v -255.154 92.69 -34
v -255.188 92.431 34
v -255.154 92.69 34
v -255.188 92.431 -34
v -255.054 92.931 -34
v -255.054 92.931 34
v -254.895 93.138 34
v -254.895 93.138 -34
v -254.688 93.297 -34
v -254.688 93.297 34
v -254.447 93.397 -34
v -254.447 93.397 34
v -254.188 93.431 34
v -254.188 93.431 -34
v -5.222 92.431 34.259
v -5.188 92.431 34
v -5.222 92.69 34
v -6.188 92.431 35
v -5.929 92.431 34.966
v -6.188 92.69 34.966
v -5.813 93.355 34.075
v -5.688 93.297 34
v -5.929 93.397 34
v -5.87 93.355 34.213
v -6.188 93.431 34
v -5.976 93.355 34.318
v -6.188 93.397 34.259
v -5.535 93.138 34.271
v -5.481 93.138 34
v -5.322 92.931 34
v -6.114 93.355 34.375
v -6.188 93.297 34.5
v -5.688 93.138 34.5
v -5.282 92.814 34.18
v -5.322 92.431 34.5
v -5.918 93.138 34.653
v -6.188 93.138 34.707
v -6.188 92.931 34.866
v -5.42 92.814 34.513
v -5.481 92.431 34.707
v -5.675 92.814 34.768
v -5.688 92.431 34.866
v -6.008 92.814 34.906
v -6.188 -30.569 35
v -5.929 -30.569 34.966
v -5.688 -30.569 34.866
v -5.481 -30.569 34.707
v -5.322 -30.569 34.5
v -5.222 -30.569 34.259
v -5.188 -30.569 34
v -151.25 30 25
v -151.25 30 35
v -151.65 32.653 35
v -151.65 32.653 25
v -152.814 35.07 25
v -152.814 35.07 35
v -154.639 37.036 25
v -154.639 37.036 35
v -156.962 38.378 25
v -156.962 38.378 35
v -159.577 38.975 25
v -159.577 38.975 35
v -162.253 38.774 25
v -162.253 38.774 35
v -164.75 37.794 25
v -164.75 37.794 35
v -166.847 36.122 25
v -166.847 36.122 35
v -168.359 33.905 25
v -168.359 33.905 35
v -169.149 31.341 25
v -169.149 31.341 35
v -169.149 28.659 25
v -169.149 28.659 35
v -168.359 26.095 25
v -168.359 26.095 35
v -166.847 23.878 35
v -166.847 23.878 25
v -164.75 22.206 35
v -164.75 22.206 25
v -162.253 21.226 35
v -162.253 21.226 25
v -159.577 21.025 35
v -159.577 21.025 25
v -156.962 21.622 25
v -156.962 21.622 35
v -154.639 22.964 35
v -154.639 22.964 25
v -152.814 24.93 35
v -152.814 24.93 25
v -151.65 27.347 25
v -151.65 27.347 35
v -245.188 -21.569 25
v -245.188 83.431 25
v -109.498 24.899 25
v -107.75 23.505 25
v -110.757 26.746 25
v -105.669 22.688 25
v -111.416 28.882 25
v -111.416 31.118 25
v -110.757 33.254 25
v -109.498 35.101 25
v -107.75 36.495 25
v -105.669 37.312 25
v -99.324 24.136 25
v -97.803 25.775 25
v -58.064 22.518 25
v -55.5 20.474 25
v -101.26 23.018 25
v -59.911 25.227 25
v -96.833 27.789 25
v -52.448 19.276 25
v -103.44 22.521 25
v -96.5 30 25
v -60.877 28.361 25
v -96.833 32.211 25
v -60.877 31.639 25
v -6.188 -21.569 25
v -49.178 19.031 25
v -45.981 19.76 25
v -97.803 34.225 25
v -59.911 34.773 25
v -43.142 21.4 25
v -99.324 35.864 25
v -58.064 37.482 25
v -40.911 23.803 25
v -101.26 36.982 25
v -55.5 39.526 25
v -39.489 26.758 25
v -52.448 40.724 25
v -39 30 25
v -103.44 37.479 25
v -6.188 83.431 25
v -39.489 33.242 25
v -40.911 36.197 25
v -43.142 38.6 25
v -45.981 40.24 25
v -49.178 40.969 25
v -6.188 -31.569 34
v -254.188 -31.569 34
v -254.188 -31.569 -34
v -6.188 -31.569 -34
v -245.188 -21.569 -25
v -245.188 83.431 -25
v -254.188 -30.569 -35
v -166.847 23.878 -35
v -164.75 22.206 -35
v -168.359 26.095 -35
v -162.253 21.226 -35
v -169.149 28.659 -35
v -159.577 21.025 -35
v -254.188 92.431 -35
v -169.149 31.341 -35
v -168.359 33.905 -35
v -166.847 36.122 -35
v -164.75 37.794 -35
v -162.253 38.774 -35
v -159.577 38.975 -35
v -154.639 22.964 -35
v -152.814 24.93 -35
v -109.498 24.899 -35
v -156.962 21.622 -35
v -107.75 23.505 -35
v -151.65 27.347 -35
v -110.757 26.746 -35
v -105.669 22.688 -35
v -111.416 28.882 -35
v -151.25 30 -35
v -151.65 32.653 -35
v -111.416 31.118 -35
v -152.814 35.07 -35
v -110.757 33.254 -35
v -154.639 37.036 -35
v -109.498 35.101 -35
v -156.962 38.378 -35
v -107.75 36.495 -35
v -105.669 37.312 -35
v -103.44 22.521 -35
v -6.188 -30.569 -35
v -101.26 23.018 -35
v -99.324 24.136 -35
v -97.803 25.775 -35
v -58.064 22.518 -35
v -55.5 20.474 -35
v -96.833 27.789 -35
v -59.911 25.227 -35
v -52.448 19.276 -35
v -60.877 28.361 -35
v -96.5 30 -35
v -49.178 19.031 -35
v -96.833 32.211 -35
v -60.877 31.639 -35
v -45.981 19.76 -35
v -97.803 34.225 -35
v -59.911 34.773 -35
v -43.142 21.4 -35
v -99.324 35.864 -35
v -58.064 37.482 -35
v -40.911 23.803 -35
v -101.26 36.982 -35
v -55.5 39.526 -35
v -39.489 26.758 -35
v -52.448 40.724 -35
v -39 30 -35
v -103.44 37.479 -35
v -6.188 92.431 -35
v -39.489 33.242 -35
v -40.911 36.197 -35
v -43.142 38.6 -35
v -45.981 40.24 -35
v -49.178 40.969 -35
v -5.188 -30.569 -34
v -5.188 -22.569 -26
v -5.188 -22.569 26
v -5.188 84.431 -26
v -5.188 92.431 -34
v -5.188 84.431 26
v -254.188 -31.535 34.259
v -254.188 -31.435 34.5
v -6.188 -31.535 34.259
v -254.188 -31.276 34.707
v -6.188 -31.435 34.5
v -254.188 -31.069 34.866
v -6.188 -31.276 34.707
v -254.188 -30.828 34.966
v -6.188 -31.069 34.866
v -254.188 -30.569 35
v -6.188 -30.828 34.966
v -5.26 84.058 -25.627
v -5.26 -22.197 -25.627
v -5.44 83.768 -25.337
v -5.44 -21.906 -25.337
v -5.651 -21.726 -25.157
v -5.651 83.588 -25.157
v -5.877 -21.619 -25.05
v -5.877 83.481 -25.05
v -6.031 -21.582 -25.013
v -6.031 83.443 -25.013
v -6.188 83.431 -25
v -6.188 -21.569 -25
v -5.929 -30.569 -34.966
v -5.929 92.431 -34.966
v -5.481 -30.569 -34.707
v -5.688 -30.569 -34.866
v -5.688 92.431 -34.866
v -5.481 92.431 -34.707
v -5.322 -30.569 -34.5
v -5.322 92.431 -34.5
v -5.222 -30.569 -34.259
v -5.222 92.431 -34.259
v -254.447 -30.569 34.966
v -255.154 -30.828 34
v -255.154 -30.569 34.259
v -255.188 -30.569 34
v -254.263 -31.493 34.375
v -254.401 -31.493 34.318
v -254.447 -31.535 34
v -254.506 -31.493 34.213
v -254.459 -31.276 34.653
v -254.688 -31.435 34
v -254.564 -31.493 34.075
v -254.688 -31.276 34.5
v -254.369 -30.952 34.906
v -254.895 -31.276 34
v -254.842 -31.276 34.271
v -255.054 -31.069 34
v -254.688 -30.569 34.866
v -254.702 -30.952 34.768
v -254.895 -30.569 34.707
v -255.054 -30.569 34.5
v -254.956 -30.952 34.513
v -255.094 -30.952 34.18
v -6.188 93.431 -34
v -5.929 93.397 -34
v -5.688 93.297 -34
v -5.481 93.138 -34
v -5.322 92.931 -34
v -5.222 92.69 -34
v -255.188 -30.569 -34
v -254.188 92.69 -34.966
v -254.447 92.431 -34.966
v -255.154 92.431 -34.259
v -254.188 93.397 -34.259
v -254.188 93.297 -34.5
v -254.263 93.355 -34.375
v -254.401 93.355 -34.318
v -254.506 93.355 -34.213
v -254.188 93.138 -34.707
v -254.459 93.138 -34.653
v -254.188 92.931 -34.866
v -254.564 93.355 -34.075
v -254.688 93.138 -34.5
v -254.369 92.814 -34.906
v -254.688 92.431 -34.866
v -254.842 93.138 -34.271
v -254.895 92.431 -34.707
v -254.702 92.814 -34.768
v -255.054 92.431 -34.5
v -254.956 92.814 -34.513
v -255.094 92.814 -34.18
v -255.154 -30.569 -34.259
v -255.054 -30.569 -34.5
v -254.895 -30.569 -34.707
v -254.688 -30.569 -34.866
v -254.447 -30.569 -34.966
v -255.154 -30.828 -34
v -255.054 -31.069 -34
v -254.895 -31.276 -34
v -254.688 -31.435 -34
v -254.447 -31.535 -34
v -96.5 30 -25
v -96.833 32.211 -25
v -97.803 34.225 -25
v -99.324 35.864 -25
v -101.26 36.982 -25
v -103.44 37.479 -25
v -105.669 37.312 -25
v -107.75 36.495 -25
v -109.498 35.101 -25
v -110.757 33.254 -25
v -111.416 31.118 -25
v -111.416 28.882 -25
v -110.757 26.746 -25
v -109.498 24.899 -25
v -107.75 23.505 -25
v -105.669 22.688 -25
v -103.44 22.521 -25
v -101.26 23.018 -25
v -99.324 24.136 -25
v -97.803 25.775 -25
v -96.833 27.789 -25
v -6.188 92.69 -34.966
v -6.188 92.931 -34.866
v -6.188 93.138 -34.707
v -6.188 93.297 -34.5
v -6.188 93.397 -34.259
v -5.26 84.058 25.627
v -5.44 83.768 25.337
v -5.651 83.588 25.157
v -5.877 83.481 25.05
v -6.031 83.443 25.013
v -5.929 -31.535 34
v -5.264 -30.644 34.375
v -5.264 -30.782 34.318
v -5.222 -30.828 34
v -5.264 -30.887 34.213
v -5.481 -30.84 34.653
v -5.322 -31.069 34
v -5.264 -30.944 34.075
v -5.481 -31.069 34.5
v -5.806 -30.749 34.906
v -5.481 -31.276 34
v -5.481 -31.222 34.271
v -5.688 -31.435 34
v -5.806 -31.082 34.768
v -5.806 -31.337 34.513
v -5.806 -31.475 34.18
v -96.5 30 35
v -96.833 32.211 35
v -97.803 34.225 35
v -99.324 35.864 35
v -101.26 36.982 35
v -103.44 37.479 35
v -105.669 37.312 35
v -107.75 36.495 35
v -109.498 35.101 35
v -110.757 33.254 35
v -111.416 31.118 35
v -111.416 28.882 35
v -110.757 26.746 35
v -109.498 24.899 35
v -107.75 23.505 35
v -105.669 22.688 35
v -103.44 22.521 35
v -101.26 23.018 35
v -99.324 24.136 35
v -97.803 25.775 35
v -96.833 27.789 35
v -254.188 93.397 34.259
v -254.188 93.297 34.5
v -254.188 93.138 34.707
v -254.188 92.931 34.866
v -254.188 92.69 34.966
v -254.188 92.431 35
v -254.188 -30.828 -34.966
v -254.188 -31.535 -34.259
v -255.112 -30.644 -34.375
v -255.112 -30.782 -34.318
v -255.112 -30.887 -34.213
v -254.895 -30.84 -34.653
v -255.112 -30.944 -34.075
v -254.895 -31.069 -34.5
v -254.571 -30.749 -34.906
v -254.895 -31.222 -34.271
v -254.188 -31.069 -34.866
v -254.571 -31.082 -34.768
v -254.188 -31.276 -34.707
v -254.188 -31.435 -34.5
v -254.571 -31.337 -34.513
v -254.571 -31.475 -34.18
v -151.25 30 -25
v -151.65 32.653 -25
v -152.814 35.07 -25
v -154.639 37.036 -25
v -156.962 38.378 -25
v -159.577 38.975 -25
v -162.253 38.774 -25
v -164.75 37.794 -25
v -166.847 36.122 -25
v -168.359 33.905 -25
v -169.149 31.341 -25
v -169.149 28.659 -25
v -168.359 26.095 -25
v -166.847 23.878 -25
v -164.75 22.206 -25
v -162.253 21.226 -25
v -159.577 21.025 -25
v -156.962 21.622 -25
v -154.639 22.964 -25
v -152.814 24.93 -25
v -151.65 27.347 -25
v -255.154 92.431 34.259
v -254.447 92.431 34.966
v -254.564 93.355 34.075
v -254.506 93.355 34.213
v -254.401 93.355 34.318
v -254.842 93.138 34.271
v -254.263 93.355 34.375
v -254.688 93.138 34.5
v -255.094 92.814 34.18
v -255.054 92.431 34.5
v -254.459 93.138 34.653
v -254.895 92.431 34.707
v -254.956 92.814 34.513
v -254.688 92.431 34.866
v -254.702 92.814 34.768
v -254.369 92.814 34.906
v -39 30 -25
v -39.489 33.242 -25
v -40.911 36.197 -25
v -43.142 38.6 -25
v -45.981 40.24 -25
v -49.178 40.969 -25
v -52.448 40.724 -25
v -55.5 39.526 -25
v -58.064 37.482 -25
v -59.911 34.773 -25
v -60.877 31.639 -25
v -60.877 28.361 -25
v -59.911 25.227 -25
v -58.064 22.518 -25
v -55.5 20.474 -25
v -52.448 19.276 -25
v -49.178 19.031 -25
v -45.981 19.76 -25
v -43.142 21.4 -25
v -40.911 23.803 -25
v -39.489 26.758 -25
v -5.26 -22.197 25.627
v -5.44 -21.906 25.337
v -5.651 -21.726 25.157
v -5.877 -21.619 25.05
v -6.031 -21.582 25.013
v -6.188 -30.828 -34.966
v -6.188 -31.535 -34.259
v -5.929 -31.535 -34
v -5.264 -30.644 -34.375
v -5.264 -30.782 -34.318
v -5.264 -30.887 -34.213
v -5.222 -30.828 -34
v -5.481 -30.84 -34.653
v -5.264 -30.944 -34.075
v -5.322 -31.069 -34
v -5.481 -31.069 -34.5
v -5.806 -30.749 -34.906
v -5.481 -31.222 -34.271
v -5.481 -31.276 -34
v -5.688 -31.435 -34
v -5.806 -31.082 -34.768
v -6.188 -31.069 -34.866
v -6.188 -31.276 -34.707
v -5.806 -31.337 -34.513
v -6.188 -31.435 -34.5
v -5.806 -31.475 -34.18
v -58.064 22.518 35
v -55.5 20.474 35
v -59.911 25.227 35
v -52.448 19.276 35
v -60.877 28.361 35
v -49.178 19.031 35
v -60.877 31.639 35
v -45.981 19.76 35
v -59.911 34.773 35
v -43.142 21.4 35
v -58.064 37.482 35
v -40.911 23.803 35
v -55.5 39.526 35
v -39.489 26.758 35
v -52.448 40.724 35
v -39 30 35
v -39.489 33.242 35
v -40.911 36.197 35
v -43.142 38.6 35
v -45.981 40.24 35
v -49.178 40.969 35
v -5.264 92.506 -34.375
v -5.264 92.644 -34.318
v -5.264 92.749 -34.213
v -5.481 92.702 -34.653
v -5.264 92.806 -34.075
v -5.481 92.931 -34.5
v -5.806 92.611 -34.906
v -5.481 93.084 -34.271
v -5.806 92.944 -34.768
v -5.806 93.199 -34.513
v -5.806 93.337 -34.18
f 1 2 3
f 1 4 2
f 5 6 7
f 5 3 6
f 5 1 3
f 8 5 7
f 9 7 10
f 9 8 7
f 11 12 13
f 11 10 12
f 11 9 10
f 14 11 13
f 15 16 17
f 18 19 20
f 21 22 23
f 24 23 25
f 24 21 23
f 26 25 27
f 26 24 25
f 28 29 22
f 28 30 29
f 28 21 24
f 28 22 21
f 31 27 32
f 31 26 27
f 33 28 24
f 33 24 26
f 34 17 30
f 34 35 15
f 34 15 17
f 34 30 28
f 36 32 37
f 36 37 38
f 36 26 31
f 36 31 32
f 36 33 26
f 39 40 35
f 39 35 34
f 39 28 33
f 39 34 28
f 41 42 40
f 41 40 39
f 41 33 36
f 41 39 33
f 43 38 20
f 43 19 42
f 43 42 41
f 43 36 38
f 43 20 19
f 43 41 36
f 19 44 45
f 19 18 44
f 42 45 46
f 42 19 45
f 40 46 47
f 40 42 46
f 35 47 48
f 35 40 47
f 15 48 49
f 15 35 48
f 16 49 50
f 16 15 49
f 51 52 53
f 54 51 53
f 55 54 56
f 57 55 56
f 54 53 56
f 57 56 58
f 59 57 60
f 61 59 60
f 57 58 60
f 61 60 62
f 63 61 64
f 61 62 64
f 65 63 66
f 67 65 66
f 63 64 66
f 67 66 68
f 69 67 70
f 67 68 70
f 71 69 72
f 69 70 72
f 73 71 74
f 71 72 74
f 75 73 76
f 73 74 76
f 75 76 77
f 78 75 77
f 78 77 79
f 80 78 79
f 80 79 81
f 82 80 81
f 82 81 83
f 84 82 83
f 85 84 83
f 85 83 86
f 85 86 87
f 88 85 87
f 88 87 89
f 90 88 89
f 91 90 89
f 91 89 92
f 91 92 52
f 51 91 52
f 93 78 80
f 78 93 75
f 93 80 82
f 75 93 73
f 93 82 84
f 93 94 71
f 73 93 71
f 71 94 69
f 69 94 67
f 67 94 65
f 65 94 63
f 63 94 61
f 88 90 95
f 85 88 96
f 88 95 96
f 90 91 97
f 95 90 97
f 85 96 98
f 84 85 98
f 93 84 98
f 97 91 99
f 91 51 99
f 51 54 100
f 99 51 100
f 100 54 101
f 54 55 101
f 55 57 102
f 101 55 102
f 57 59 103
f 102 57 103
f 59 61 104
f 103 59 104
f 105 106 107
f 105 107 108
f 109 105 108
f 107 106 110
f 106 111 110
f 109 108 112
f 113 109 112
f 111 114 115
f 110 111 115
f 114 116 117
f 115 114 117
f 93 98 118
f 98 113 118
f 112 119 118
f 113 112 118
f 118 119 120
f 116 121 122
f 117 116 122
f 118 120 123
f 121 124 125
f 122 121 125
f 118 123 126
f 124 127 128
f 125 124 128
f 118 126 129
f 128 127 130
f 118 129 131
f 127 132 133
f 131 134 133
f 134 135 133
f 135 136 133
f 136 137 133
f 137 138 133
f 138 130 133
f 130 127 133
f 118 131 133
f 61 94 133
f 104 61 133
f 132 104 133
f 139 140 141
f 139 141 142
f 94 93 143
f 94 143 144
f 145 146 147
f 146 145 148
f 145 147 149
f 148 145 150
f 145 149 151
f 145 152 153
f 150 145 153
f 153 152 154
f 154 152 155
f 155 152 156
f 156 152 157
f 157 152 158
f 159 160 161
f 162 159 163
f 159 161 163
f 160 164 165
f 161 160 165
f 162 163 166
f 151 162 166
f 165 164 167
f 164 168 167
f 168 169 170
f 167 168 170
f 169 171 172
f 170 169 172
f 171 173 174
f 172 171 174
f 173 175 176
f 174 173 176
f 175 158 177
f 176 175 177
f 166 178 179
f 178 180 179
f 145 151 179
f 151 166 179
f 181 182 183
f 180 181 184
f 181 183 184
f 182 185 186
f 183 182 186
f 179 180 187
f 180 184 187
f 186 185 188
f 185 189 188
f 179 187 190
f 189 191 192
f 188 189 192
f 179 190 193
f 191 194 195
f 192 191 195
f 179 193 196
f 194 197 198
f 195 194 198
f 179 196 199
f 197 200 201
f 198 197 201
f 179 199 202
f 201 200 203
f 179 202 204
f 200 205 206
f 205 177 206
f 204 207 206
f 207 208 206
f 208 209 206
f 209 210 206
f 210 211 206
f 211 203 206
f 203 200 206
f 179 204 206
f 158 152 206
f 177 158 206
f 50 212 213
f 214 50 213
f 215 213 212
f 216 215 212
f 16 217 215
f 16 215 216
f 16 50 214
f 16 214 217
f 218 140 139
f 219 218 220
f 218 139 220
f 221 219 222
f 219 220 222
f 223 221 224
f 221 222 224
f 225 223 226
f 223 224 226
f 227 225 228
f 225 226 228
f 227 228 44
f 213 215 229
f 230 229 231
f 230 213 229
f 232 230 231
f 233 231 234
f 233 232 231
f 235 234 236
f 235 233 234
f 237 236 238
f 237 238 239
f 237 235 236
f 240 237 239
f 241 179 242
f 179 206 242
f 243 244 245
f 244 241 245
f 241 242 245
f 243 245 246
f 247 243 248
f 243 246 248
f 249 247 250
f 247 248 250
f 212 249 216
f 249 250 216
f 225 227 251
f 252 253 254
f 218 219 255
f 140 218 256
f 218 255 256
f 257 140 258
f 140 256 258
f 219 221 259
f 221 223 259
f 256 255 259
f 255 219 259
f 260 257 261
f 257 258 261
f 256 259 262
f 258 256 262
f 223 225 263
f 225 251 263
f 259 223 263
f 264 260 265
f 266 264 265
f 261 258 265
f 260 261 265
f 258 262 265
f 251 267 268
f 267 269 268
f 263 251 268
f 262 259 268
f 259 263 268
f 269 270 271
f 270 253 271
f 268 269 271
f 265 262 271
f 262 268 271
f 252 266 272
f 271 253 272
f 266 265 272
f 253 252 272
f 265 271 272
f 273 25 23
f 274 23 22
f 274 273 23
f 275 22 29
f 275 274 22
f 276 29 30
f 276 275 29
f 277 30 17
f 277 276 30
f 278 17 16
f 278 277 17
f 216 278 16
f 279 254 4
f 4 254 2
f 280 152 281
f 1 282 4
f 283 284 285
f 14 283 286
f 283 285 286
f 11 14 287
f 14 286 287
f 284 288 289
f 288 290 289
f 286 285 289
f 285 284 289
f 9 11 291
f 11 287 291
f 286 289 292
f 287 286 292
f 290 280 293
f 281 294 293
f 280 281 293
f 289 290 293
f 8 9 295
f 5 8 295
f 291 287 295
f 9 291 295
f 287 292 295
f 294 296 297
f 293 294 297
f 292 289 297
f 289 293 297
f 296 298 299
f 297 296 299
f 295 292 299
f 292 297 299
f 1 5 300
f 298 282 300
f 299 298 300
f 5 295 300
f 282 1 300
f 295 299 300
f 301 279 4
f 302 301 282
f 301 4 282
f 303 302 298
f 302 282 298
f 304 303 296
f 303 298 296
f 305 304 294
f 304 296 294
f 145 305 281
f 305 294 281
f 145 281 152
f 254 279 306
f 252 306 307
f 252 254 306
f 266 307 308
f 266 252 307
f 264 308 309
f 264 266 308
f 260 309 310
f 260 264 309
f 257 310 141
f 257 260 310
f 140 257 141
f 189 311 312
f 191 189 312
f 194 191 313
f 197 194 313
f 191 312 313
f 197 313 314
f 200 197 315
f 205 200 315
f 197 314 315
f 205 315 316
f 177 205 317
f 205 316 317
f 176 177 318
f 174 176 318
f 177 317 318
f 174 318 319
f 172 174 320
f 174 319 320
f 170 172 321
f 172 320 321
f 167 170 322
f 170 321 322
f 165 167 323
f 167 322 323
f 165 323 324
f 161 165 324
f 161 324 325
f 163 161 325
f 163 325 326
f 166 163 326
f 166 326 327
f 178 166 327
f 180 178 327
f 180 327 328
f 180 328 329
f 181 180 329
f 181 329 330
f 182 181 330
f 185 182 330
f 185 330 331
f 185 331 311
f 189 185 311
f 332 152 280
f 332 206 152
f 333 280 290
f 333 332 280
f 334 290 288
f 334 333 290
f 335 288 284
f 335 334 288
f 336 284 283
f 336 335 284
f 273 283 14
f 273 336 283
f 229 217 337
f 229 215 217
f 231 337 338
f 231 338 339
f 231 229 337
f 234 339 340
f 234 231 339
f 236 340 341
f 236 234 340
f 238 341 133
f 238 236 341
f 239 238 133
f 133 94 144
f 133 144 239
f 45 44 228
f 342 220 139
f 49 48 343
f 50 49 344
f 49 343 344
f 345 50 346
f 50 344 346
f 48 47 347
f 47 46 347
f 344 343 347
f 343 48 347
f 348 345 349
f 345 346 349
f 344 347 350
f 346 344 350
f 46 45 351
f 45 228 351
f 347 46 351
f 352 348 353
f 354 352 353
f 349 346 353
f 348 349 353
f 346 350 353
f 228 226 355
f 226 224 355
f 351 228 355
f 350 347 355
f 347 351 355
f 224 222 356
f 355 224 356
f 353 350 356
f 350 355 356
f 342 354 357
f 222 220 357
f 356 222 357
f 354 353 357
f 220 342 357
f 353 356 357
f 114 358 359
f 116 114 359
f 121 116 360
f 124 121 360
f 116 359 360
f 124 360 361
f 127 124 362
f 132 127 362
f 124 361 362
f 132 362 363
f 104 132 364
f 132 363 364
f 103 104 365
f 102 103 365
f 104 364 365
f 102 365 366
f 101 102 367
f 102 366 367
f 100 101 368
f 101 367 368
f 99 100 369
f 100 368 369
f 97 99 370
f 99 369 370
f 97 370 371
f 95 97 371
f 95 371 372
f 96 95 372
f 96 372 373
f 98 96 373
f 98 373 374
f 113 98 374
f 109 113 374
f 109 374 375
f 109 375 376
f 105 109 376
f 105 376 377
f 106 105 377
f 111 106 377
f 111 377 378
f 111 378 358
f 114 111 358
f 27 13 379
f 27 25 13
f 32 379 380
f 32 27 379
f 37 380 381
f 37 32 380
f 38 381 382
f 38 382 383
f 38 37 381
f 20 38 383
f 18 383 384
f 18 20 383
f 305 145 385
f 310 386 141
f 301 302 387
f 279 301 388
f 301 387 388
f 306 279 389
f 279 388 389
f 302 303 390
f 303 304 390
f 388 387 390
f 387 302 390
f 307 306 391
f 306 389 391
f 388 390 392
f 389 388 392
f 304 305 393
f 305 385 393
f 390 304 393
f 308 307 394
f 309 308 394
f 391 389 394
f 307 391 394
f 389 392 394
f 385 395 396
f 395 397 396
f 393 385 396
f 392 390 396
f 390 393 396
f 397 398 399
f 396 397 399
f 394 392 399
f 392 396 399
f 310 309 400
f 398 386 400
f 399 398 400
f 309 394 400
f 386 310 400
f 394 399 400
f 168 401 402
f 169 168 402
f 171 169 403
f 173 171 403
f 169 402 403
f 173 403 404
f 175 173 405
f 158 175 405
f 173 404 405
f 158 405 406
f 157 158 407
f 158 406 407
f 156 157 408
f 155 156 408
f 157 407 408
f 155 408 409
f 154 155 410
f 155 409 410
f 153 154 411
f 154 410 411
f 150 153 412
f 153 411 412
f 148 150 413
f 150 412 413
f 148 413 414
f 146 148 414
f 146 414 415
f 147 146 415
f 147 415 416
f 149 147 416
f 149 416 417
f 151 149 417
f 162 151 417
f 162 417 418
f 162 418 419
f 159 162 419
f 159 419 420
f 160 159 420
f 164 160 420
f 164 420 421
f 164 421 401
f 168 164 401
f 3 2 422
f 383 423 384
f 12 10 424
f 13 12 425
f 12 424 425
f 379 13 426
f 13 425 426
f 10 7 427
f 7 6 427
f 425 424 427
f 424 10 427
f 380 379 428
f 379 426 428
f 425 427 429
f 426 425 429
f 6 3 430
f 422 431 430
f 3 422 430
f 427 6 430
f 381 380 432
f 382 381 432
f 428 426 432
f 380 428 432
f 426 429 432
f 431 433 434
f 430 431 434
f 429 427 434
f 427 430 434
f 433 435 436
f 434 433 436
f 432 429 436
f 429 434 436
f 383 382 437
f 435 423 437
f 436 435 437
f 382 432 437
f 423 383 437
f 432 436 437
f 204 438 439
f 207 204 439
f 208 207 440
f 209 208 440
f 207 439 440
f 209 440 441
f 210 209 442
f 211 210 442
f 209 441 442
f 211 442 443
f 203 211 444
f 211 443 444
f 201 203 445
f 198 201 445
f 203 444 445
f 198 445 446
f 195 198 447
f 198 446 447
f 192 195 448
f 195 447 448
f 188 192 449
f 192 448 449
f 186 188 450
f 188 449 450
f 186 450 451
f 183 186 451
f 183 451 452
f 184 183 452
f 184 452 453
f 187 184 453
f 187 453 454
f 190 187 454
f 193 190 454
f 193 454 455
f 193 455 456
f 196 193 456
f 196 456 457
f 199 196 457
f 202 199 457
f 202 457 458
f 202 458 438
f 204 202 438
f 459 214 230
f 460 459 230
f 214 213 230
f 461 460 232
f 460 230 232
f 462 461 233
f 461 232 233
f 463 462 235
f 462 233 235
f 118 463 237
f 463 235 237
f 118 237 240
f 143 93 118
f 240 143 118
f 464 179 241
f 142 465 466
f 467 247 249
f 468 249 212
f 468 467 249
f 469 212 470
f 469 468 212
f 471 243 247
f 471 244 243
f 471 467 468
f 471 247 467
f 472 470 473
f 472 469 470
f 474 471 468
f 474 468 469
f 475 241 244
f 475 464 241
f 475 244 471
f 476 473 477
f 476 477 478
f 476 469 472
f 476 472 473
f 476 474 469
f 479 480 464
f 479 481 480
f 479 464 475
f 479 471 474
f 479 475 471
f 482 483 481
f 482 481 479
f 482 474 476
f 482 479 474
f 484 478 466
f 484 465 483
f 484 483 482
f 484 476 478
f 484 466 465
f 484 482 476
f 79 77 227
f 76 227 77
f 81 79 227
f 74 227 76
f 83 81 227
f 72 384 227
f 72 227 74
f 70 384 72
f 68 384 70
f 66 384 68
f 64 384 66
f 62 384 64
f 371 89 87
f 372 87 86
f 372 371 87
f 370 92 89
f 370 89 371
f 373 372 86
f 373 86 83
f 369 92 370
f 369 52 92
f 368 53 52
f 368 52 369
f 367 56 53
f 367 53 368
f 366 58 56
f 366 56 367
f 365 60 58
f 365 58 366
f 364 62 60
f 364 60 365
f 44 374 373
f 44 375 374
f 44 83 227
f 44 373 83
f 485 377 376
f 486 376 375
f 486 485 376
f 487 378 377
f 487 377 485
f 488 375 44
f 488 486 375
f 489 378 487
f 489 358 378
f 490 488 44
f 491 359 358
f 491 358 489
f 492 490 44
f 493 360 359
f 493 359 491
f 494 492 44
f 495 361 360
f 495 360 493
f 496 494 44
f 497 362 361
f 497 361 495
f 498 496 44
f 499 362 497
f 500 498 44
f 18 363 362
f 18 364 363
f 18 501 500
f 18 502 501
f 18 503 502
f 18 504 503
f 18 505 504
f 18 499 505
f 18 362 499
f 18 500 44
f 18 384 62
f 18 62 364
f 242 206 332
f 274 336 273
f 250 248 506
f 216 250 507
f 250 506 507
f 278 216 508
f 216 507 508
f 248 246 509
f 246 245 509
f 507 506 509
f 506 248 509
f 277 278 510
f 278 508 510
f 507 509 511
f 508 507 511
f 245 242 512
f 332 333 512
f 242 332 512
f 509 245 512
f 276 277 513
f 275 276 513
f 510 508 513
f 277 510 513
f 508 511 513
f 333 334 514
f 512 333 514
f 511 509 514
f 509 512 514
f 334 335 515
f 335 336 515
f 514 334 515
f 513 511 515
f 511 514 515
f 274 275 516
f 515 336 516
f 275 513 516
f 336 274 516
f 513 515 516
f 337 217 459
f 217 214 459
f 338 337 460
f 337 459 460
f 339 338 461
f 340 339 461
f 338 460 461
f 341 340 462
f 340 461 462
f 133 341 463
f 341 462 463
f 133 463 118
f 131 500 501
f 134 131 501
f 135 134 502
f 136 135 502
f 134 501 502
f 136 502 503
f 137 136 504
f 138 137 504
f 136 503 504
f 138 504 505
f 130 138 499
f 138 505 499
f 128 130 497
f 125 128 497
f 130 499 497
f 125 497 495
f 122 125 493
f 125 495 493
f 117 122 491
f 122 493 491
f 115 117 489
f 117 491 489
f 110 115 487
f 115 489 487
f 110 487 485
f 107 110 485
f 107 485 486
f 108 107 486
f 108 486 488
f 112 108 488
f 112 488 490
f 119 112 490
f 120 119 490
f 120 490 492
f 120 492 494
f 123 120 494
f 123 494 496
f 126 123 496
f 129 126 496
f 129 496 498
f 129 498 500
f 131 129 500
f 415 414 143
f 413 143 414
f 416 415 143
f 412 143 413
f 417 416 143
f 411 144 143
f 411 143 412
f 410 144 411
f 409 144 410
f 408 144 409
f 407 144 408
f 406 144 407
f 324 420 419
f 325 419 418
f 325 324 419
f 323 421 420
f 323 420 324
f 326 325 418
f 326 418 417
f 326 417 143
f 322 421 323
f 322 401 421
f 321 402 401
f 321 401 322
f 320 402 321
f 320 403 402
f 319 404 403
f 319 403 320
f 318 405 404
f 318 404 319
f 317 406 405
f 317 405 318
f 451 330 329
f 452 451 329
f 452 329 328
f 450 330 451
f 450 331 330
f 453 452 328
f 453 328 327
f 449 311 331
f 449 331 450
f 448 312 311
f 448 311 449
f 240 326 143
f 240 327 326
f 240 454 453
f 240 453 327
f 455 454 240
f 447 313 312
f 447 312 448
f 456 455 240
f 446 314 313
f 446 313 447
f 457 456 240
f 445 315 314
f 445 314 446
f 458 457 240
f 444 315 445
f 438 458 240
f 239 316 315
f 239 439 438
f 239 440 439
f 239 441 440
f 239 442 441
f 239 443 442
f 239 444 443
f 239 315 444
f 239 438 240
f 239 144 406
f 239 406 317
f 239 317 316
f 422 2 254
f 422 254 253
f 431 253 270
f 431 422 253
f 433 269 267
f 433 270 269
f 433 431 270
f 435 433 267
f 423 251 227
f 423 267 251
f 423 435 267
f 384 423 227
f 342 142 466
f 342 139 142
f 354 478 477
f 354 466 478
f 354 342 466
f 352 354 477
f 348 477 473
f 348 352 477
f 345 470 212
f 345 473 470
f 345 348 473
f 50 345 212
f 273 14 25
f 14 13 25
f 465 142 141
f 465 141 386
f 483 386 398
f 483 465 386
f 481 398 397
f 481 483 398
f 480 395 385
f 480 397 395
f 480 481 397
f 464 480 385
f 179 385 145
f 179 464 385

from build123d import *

# Parameters (mm, degrees)
SKETCH1_W           = 250
SKETCH1_H           = 125
BOSS_EXTRUDE1_DEPTH = 35
SHELL1_T            = -10
SKETCH2_R           = 11
SKETCH2_R_2         = 7.5
SKETCH2_R_3         = 9
CUT_EXTRUDE1_DEPTH  = 70
FILLET1_R           = 1


with BuildPart() as part:
    # Sketch1 → Boss-Extrude1 (new body, symmetric)
    with BuildSketch(Plane.XY):
        with Locations((-130.188284519, 30.930962343)):
            Rectangle(SKETCH1_W, SKETCH1_H)
    extrude(amount=BOSS_EXTRUDE1_DEPTH, both=True)

    # Shell1
    shell1_openings = [part.faces().sort_by_distance(p)[0] for p in [
        (-5.188284519, 30.930962343, 0),
    ]]
    offset(amount=SHELL1_T, openings=shell1_openings, kind=Kind.INTERSECTION)

    # Sketch2 → Cut-Extrude1 (cut)
    with BuildSketch(Plane.XY.offset(35)):
        with Locations((-50, 30)):
            Circle(SKETCH2_R)
        with Locations((-104, 30)):
            Circle(SKETCH2_R_2)
        with Locations((-160.25, 30)):
            Circle(SKETCH2_R_3)
    extrude(amount=-CUT_EXTRUDE1_DEPTH, mode=Mode.SUBTRACT)

    # Fillet1
    fillet1_edges = [part.edges().sort_by_distance(p)[0] for p in [
        (-255.188284519, 30.930962343, 35),
        (-5.188284519, 30.930962343, -25),
        (-5.188284519, -21.569037657, 0),
        (-5.188284519, 83.430962343, 0),
        (-130.188284519, -31.569037657, 35),
        (-5.188284519, 30.930962343, 25),
        (-5.188284519, 30.930962343, 35),
        (-130.188284519, -31.569037657, -35),
        (-255.188284519, 30.930962343, -35),
        (-130.188284519, 93.430962343, -35),
        (-5.188284519, 30.930962343, -35),
        (-5.188284519, -31.569037657, 0),
        (-255.188284519, -31.569037657, 0),
        (-255.188284519, 93.430962343, 0),
        (-5.188284519, 93.430962343, 0),
        (-130.188284519, 93.430962343, 35),
    ]]
    fillet(fillet1_edges, radius=FILLET1_R)


solid = part.part
